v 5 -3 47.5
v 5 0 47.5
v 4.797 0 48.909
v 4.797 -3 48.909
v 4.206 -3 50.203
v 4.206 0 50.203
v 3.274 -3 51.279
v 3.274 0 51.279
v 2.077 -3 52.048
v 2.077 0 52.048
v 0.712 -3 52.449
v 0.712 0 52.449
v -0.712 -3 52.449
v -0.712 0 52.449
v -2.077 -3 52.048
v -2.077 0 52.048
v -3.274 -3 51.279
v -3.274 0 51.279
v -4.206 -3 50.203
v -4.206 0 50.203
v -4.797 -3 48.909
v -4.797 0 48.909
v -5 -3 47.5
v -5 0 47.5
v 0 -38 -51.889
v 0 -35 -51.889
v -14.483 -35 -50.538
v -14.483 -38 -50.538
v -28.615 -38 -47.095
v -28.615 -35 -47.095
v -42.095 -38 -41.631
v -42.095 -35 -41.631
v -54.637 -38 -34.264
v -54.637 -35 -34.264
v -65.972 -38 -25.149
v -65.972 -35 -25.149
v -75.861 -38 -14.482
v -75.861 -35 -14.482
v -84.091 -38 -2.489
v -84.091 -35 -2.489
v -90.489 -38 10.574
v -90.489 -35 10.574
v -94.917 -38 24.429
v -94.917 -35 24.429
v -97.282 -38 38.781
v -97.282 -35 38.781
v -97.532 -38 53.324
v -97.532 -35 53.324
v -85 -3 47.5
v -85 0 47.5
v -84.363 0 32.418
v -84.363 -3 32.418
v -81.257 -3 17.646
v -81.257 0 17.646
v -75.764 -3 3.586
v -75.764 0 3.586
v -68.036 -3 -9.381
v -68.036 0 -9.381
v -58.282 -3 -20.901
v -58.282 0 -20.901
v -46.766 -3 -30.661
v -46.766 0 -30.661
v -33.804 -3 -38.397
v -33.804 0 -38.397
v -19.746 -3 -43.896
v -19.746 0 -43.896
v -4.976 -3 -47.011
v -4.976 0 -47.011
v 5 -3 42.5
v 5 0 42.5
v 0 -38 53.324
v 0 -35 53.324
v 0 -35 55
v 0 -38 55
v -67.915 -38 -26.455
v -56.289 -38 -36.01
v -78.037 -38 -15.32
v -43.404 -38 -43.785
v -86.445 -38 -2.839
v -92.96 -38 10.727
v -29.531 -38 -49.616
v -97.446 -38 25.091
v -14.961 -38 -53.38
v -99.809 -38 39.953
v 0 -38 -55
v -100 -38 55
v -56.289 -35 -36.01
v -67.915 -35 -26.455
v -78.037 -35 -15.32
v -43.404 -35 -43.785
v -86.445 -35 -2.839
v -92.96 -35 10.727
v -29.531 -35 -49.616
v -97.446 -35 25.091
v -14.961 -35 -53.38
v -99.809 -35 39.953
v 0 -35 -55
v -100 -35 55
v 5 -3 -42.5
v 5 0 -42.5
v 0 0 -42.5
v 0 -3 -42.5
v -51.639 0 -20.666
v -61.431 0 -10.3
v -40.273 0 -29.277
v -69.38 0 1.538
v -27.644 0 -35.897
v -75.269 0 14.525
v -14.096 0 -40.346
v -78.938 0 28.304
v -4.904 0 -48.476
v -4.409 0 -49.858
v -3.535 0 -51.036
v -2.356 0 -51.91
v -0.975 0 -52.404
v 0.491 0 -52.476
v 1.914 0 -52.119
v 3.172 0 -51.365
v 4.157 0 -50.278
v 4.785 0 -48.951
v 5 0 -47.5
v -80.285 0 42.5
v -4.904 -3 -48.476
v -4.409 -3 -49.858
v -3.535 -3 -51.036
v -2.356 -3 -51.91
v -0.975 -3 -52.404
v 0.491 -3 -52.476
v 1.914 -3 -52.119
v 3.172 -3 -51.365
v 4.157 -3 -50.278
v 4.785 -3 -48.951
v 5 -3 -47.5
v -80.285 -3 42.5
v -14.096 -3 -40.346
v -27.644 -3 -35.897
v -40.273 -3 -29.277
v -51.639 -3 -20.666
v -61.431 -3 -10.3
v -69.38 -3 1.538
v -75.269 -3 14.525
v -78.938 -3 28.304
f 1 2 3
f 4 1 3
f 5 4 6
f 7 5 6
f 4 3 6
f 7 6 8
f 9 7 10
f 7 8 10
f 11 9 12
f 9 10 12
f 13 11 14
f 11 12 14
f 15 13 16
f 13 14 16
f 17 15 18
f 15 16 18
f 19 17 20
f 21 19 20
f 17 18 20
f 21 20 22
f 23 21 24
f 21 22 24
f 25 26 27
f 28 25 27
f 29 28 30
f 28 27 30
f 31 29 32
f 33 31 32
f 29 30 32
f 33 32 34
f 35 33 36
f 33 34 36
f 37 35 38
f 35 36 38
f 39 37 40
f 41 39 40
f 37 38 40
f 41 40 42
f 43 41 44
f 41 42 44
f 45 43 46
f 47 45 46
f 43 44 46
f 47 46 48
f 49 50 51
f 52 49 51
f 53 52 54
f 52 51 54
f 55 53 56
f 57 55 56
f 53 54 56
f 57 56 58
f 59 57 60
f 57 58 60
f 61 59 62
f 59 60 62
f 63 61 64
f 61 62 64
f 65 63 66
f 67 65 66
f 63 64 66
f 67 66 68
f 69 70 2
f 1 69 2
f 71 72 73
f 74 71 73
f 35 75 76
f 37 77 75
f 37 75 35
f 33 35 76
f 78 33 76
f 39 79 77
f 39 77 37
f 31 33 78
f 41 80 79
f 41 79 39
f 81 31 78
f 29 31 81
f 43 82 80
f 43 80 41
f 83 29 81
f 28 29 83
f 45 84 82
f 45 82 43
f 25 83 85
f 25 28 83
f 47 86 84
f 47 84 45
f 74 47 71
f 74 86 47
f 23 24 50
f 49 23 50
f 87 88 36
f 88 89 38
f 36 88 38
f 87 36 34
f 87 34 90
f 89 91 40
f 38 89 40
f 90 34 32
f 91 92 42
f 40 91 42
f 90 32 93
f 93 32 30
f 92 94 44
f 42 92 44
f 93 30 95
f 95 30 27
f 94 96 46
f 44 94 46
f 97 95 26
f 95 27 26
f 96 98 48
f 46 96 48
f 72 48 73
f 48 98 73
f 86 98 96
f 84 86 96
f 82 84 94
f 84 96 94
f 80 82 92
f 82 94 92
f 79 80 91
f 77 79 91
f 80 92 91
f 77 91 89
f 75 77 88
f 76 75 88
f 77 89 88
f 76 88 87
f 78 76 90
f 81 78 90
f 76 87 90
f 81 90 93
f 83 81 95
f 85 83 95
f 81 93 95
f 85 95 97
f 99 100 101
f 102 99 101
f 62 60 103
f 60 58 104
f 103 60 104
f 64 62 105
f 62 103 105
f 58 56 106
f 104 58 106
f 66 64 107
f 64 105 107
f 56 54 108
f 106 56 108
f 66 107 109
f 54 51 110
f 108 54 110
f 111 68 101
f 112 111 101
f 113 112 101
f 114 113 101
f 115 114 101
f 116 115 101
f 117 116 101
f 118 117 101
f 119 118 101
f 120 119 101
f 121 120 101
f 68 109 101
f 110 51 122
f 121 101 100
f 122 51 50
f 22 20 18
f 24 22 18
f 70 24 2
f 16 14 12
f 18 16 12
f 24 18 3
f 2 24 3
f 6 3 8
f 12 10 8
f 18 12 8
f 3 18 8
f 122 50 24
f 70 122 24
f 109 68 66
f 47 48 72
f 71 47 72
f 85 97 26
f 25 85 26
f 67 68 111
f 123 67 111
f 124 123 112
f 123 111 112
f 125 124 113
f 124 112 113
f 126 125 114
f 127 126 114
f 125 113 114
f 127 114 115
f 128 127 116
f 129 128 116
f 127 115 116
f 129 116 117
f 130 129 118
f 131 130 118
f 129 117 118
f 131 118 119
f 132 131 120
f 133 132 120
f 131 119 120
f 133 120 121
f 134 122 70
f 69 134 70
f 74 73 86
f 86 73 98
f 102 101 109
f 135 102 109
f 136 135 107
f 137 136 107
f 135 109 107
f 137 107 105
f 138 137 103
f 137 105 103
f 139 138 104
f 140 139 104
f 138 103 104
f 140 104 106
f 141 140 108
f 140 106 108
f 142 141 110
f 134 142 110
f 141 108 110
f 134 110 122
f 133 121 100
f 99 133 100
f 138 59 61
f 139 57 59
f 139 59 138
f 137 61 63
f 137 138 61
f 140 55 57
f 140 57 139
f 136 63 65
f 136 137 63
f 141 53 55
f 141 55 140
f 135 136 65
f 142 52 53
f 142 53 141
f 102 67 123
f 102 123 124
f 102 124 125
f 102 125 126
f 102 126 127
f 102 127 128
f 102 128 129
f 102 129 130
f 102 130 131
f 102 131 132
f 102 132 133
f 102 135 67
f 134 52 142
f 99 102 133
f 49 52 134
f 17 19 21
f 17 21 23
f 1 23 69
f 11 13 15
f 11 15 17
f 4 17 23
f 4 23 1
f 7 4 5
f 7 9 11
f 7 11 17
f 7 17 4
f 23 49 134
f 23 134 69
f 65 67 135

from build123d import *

# Parameters (mm, degrees)
F3_DEPTH = 3
F4_DEPTH = 3


# Not quite as in the source:
# - the program builds the solid bodies; features that only make, move or delete a surface that nothing else refers to are left out


with BuildPart() as f3:
    # F2 (on offset) → F3 (new body)
    with BuildSketch(Plane.XZ.offset(35)):
        with BuildLine():
            Line((0, 53.3243566751), (0, 55))
            Line((0, 55), (-100, 55))
            ThreePointArc((-100, 55), (-73.1778339448, -21.0707581316), (0, -55))
            Line((0, -55), (0, -51.8885441124))
            ThreePointArc((0, -51.8885441124), (-71.111364106, -19.9961360664), (-97.532135104, 53.3243566751))
            Line((-97.532135104, 53.3243566751), (0, 53.3243566751))
        make_face()
    extrude(amount=F3_DEPTH)


with BuildPart() as f4:
    # F0 (on Front) → F4 (new body)
    with BuildSketch(Plane.XZ):
        with BuildLine():
            Line((-5, 47.5), (0, 47.5))
            Line((0, 47.5), (5, 47.5))
            ThreePointArc((5, 47.5), (0, 52.5), (-5, 47.5))
        make_face()
        with BuildLine():
            Line((0, 42.5), (0, 47.5))
            Line((0, 47.5), (-5, 47.5))
            ThreePointArc((-5, 47.5), (-3.5355339059, 43.9644660941), (0, 42.5))
        make_face()
        with BuildLine():
            Line((5, 47.5), (0, 47.5))
            Line((0, 47.5), (0, 42.5))
            ThreePointArc((0, 42.5), (3.5355339059, 43.9644660941), (5, 47.5))
        make_face()
        with BuildLine():
            Line((-80.2852206571, 42.5), (0, 42.5))
            ThreePointArc((0, 42.5), (-3.5355339059, 43.9644660941), (-5, 47.5))
            Line((-5, 47.5), (-85, 47.5))
            ThreePointArc((-85, 47.5), (-63.3965803265, -15.3423221911), (-4.9760293042, -47.0109883803))
            ThreePointArc((-4.9760293042, -47.0109883803), (-3.3581945969, -43.7956067907), (0, -42.5))
            ThreePointArc((0, -42.5), (-56.7498093098, -15.6860309965), (-80.2852206571, 42.5))
        make_face()
        with BuildLine():
            ThreePointArc((5, -47.5), (3.5355339059, -43.9644660941), (0, -42.5))
            ThreePointArc((0, -42.5), (-3.3581945969, -43.7956067907), (-4.9760293042, -47.0109883803))
            ThreePointArc((-4.9760293042, -47.0109883803), (-2.4913542209, -47.289476598), (0, -47.5))
            Line((0, -47.5), (5, -47.5))
        make_face()
        with BuildLine():
            ThreePointArc((-4.9760293042, -47.0109883803), (-0.2447993865, -52.4940037305), (5, -47.5))
            Line((5, -47.5), (0, -47.5))
            ThreePointArc((0, -47.5), (-2.4913542209, -47.289476598), (-4.9760293042, -47.0109883803))
        make_face()
        with BuildLine():
            Line((5, -42.5), (0, -42.5))
            ThreePointArc((0, -42.5), (3.5355339059, -43.9644660941), (5, -47.5))
            Line((5, -47.5), (5, -42.5))
        make_face()
        with BuildLine():
            ThreePointArc((5, 47.5), (3.5355339059, 43.9644660941), (0, 42.5))
            Line((0, 42.5), (5, 42.5))
            Line((5, 42.5), (5, 47.5))
        make_face()
    extrude(amount=F4_DEPTH)


solid = Compound([f3.part, f4.part])
